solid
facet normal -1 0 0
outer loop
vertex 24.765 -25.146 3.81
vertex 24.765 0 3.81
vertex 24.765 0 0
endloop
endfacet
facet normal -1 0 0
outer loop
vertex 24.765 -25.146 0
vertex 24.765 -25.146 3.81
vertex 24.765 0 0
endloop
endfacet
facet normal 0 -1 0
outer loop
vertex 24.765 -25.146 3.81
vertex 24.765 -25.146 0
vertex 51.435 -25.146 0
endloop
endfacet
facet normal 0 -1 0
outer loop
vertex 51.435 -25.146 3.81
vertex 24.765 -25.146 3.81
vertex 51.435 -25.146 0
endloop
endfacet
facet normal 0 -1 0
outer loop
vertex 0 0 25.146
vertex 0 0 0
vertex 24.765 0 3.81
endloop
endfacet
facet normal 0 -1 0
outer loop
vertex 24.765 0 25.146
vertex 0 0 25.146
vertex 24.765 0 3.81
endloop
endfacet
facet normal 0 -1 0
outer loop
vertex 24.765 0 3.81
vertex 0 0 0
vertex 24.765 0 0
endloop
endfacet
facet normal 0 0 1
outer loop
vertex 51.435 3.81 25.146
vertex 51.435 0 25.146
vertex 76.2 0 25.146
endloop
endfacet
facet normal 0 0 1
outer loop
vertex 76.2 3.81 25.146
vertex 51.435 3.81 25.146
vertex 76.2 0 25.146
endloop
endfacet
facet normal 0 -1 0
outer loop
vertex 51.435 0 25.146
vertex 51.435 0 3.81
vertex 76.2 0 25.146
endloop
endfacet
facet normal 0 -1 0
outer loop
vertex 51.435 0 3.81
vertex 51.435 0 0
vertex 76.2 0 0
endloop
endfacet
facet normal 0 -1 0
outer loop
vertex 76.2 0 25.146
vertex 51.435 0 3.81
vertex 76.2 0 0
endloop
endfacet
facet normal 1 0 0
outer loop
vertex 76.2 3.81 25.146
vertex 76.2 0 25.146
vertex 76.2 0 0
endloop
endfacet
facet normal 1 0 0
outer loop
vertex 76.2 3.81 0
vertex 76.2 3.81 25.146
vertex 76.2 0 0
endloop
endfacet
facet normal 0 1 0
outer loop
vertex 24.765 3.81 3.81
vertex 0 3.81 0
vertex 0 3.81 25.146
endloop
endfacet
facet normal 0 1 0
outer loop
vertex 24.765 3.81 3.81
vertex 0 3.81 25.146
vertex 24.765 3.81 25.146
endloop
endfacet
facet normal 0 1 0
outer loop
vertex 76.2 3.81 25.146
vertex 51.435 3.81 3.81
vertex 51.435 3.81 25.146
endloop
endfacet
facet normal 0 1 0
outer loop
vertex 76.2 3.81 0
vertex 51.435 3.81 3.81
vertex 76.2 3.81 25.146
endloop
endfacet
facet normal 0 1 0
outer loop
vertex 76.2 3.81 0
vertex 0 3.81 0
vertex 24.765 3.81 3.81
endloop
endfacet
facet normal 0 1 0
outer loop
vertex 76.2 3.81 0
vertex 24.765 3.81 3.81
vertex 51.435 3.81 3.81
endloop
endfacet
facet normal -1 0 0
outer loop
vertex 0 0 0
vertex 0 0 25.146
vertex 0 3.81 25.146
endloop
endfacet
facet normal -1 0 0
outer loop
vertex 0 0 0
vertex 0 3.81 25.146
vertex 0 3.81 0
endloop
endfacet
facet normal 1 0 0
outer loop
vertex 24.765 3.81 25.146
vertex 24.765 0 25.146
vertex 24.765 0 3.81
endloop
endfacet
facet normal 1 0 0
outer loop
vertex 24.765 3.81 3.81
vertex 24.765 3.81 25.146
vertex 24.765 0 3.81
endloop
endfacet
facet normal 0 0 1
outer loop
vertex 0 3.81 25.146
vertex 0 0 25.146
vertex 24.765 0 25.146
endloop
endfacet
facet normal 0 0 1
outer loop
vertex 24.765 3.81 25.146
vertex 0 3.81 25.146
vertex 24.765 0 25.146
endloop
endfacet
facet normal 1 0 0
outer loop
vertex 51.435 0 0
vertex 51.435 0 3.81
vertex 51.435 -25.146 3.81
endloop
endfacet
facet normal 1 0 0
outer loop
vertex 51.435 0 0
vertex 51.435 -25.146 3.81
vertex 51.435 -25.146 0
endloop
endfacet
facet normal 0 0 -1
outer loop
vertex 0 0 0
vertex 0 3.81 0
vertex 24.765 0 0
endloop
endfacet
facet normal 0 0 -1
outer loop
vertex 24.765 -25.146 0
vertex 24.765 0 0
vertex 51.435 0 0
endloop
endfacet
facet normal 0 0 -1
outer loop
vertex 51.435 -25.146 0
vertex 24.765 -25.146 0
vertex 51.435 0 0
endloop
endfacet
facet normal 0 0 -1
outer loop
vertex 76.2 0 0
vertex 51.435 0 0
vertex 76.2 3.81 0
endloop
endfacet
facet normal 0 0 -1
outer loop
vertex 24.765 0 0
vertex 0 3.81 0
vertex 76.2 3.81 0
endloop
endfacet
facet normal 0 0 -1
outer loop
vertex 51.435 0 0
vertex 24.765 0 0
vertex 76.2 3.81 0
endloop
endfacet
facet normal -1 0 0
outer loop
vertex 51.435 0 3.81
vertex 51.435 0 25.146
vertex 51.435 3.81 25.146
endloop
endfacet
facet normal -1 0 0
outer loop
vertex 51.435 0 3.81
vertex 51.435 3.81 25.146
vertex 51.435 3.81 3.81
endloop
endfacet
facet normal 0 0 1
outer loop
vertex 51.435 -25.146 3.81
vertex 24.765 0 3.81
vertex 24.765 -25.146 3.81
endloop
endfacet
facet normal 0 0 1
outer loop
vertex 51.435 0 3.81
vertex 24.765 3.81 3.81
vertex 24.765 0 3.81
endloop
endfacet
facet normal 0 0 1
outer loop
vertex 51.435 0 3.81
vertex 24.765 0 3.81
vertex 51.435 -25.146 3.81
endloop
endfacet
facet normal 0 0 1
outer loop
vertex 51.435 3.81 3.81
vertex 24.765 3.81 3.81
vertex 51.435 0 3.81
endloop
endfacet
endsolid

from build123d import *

# Parameters (mm, degrees)
SKETCH1_W             = 24.765
SKETCH1_H             = 25.146
BOSS_EXTRUDE1_DEPTH   = 3.81
BOSS_EXTRUDE1_2_DEPTH = 3.81
SKETCH2_W             = 26.67
SKETCH2_H             = 3.81
BOSS_EXTRUDE2_DEPTH   = 28.956


with BuildPart() as part:
    # Sketch1 → Boss-Extrude1 (new body)
    with BuildSketch(Plane(origin=(0, 0, 0), x_dir=(1, 0, 0), z_dir=(0, 1, 0))):
        with Locations((12.3825, -12.573)):
            Rectangle(SKETCH1_W, SKETCH1_H)
    extrude(amount=BOSS_EXTRUDE1_DEPTH)



with BuildPart() as body_2:
    # Sketch1 → Boss-Extrude1 2 (new body)
    with BuildSketch(Plane(origin=(0, 0, 0), x_dir=(1, 0, 0), z_dir=(0, 1, 0))):
        with Locations((63.8175, -12.573)):
            Rectangle(SKETCH1_W, SKETCH1_H)
    extrude(amount=BOSS_EXTRUDE1_2_DEPTH)


with BuildPart() as part_1:
    add(part.part)

    add(body_2.part)  # Boss-Extrude2 merges body 2
    # Sketch2 → Boss-Extrude2 (add)
    with BuildSketch(Plane(origin=(0, 3.81, 0), x_dir=(1, 0, 0), z_dir=(0, 1, 0))):
        with Locations((38.1, -1.905)):
            Rectangle(SKETCH2_W, SKETCH2_H)
    extrude(amount=-BOSS_EXTRUDE2_DEPTH)


solid = part_1.part
